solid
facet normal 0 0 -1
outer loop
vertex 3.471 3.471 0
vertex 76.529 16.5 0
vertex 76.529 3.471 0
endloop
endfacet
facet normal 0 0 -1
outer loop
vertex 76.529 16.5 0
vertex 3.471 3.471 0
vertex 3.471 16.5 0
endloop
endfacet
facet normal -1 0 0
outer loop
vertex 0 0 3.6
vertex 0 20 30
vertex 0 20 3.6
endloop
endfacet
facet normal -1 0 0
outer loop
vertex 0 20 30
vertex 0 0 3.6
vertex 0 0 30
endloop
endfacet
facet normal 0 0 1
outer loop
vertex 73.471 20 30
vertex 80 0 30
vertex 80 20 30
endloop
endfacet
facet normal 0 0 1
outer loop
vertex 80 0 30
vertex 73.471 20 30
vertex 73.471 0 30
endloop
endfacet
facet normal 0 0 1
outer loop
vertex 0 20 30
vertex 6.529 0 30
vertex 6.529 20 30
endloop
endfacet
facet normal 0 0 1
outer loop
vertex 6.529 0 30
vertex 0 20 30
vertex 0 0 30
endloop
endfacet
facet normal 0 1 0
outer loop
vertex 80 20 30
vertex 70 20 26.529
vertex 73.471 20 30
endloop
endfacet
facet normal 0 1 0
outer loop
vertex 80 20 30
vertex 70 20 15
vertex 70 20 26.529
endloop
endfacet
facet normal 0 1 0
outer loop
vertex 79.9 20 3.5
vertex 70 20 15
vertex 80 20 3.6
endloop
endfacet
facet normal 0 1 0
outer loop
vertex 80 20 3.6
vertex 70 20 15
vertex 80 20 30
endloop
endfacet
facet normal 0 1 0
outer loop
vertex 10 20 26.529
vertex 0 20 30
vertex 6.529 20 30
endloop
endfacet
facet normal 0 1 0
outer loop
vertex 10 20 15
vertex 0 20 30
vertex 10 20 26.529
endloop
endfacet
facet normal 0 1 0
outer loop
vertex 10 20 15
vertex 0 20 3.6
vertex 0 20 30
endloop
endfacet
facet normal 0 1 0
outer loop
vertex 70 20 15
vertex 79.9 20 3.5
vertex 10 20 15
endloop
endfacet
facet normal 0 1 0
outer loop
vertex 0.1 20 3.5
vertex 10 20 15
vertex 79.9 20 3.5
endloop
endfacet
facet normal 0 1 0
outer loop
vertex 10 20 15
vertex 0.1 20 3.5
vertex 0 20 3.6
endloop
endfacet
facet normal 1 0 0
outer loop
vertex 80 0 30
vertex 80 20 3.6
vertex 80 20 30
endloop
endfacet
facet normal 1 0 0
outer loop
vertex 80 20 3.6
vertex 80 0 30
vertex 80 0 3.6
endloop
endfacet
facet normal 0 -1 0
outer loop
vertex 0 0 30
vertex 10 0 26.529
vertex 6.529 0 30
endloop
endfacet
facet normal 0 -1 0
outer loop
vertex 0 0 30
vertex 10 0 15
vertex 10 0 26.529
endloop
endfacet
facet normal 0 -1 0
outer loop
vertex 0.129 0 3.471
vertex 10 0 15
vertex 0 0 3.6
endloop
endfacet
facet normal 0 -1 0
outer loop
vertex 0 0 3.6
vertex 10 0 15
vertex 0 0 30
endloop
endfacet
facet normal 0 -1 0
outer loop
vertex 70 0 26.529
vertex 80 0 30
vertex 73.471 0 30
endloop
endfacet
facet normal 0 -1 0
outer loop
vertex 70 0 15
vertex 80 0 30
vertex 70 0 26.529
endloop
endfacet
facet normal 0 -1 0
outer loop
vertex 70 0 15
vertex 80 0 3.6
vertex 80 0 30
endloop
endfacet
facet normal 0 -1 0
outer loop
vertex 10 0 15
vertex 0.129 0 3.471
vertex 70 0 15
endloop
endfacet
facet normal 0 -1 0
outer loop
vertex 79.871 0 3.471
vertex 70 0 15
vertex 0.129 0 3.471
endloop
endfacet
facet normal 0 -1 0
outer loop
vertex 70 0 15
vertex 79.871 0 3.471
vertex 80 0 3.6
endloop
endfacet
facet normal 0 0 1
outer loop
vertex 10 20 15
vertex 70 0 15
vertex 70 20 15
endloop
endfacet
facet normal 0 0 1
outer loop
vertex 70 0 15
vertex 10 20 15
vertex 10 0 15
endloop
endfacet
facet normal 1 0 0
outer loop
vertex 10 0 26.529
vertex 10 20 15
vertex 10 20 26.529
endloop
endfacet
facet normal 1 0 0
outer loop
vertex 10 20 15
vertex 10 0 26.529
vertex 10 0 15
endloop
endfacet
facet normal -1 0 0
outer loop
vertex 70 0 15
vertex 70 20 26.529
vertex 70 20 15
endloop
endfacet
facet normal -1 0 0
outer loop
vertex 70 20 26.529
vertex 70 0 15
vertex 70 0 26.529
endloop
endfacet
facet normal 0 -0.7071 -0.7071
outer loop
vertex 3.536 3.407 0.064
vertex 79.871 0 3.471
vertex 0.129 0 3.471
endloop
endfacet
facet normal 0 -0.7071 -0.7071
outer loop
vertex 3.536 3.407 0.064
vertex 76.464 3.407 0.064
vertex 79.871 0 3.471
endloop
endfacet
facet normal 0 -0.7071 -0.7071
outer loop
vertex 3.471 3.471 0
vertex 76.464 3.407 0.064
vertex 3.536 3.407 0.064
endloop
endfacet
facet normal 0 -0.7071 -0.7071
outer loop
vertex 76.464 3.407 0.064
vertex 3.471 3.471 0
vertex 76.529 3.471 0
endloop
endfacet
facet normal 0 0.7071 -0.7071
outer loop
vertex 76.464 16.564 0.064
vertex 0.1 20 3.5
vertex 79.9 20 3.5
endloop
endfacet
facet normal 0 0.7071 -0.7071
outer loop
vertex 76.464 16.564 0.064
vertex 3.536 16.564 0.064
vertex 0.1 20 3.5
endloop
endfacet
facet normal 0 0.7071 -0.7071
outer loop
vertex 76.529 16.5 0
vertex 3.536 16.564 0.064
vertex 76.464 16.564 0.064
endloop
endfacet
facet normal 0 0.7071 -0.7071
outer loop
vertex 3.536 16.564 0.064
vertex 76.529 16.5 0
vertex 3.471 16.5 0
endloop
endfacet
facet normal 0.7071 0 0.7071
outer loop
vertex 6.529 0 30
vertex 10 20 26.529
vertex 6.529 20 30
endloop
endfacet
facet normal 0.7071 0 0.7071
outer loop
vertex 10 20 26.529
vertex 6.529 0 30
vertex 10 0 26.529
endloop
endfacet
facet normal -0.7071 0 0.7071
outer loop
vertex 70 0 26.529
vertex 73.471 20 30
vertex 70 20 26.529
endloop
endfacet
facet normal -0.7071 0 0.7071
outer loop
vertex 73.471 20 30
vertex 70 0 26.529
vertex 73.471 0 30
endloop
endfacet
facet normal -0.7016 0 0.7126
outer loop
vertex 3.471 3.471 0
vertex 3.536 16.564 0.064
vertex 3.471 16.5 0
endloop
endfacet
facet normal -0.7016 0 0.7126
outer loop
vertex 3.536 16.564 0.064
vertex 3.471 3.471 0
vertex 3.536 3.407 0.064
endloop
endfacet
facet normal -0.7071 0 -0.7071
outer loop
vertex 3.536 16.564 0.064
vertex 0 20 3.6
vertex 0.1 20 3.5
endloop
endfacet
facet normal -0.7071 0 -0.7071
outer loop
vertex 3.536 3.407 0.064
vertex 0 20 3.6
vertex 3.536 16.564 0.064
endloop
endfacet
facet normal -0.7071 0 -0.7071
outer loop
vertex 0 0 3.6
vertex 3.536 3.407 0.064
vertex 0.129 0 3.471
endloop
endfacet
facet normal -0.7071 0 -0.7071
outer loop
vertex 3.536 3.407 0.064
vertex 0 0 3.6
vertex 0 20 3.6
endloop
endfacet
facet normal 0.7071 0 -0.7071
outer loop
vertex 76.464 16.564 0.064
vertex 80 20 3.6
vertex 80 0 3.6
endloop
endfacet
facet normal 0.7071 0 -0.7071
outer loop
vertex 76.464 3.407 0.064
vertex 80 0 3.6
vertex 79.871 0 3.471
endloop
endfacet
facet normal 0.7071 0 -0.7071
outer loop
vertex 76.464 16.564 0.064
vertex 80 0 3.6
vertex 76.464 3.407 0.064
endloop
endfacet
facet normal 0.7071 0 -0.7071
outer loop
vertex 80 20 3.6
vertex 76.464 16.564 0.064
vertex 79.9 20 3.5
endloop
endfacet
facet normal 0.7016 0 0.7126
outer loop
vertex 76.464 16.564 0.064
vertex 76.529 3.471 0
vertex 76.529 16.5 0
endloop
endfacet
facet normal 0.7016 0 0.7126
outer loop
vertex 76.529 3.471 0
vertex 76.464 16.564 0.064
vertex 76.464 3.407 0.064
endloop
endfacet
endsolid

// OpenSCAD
difference() {
    linear_extrude(30) square([80,20]);
    translate([10,0,15]) linear_extrude(30) square([60,20]);
    translate([0,-3.6,0]) rotate([45,0,0]) rotate([0,90,0]) linear_extrude(80) square([5,5]);
    translate([0,16.5,0]) rotate([45,0,0]) rotate([0,90,0]) linear_extrude(80) square([5,5]);
    translate([10,0,33.6]) rotate([0,45,0]) rotate([-90,0,0]) linear_extrude(20) square([5,5]);
    translate([70,0,33.6]) rotate([0,45,0]) rotate([-90,0,0]) linear_extrude(20) square([5,5]);
    translate([0,0,3.6]) rotate([0,45,0]) rotate([-90,0,0]) linear_extrude(20) square([5,5]);
    translate([80,0,3.6]) rotate([0,45,0]) rotate([-90,0,0]) linear_extrude(20) square([5,5]);
}
